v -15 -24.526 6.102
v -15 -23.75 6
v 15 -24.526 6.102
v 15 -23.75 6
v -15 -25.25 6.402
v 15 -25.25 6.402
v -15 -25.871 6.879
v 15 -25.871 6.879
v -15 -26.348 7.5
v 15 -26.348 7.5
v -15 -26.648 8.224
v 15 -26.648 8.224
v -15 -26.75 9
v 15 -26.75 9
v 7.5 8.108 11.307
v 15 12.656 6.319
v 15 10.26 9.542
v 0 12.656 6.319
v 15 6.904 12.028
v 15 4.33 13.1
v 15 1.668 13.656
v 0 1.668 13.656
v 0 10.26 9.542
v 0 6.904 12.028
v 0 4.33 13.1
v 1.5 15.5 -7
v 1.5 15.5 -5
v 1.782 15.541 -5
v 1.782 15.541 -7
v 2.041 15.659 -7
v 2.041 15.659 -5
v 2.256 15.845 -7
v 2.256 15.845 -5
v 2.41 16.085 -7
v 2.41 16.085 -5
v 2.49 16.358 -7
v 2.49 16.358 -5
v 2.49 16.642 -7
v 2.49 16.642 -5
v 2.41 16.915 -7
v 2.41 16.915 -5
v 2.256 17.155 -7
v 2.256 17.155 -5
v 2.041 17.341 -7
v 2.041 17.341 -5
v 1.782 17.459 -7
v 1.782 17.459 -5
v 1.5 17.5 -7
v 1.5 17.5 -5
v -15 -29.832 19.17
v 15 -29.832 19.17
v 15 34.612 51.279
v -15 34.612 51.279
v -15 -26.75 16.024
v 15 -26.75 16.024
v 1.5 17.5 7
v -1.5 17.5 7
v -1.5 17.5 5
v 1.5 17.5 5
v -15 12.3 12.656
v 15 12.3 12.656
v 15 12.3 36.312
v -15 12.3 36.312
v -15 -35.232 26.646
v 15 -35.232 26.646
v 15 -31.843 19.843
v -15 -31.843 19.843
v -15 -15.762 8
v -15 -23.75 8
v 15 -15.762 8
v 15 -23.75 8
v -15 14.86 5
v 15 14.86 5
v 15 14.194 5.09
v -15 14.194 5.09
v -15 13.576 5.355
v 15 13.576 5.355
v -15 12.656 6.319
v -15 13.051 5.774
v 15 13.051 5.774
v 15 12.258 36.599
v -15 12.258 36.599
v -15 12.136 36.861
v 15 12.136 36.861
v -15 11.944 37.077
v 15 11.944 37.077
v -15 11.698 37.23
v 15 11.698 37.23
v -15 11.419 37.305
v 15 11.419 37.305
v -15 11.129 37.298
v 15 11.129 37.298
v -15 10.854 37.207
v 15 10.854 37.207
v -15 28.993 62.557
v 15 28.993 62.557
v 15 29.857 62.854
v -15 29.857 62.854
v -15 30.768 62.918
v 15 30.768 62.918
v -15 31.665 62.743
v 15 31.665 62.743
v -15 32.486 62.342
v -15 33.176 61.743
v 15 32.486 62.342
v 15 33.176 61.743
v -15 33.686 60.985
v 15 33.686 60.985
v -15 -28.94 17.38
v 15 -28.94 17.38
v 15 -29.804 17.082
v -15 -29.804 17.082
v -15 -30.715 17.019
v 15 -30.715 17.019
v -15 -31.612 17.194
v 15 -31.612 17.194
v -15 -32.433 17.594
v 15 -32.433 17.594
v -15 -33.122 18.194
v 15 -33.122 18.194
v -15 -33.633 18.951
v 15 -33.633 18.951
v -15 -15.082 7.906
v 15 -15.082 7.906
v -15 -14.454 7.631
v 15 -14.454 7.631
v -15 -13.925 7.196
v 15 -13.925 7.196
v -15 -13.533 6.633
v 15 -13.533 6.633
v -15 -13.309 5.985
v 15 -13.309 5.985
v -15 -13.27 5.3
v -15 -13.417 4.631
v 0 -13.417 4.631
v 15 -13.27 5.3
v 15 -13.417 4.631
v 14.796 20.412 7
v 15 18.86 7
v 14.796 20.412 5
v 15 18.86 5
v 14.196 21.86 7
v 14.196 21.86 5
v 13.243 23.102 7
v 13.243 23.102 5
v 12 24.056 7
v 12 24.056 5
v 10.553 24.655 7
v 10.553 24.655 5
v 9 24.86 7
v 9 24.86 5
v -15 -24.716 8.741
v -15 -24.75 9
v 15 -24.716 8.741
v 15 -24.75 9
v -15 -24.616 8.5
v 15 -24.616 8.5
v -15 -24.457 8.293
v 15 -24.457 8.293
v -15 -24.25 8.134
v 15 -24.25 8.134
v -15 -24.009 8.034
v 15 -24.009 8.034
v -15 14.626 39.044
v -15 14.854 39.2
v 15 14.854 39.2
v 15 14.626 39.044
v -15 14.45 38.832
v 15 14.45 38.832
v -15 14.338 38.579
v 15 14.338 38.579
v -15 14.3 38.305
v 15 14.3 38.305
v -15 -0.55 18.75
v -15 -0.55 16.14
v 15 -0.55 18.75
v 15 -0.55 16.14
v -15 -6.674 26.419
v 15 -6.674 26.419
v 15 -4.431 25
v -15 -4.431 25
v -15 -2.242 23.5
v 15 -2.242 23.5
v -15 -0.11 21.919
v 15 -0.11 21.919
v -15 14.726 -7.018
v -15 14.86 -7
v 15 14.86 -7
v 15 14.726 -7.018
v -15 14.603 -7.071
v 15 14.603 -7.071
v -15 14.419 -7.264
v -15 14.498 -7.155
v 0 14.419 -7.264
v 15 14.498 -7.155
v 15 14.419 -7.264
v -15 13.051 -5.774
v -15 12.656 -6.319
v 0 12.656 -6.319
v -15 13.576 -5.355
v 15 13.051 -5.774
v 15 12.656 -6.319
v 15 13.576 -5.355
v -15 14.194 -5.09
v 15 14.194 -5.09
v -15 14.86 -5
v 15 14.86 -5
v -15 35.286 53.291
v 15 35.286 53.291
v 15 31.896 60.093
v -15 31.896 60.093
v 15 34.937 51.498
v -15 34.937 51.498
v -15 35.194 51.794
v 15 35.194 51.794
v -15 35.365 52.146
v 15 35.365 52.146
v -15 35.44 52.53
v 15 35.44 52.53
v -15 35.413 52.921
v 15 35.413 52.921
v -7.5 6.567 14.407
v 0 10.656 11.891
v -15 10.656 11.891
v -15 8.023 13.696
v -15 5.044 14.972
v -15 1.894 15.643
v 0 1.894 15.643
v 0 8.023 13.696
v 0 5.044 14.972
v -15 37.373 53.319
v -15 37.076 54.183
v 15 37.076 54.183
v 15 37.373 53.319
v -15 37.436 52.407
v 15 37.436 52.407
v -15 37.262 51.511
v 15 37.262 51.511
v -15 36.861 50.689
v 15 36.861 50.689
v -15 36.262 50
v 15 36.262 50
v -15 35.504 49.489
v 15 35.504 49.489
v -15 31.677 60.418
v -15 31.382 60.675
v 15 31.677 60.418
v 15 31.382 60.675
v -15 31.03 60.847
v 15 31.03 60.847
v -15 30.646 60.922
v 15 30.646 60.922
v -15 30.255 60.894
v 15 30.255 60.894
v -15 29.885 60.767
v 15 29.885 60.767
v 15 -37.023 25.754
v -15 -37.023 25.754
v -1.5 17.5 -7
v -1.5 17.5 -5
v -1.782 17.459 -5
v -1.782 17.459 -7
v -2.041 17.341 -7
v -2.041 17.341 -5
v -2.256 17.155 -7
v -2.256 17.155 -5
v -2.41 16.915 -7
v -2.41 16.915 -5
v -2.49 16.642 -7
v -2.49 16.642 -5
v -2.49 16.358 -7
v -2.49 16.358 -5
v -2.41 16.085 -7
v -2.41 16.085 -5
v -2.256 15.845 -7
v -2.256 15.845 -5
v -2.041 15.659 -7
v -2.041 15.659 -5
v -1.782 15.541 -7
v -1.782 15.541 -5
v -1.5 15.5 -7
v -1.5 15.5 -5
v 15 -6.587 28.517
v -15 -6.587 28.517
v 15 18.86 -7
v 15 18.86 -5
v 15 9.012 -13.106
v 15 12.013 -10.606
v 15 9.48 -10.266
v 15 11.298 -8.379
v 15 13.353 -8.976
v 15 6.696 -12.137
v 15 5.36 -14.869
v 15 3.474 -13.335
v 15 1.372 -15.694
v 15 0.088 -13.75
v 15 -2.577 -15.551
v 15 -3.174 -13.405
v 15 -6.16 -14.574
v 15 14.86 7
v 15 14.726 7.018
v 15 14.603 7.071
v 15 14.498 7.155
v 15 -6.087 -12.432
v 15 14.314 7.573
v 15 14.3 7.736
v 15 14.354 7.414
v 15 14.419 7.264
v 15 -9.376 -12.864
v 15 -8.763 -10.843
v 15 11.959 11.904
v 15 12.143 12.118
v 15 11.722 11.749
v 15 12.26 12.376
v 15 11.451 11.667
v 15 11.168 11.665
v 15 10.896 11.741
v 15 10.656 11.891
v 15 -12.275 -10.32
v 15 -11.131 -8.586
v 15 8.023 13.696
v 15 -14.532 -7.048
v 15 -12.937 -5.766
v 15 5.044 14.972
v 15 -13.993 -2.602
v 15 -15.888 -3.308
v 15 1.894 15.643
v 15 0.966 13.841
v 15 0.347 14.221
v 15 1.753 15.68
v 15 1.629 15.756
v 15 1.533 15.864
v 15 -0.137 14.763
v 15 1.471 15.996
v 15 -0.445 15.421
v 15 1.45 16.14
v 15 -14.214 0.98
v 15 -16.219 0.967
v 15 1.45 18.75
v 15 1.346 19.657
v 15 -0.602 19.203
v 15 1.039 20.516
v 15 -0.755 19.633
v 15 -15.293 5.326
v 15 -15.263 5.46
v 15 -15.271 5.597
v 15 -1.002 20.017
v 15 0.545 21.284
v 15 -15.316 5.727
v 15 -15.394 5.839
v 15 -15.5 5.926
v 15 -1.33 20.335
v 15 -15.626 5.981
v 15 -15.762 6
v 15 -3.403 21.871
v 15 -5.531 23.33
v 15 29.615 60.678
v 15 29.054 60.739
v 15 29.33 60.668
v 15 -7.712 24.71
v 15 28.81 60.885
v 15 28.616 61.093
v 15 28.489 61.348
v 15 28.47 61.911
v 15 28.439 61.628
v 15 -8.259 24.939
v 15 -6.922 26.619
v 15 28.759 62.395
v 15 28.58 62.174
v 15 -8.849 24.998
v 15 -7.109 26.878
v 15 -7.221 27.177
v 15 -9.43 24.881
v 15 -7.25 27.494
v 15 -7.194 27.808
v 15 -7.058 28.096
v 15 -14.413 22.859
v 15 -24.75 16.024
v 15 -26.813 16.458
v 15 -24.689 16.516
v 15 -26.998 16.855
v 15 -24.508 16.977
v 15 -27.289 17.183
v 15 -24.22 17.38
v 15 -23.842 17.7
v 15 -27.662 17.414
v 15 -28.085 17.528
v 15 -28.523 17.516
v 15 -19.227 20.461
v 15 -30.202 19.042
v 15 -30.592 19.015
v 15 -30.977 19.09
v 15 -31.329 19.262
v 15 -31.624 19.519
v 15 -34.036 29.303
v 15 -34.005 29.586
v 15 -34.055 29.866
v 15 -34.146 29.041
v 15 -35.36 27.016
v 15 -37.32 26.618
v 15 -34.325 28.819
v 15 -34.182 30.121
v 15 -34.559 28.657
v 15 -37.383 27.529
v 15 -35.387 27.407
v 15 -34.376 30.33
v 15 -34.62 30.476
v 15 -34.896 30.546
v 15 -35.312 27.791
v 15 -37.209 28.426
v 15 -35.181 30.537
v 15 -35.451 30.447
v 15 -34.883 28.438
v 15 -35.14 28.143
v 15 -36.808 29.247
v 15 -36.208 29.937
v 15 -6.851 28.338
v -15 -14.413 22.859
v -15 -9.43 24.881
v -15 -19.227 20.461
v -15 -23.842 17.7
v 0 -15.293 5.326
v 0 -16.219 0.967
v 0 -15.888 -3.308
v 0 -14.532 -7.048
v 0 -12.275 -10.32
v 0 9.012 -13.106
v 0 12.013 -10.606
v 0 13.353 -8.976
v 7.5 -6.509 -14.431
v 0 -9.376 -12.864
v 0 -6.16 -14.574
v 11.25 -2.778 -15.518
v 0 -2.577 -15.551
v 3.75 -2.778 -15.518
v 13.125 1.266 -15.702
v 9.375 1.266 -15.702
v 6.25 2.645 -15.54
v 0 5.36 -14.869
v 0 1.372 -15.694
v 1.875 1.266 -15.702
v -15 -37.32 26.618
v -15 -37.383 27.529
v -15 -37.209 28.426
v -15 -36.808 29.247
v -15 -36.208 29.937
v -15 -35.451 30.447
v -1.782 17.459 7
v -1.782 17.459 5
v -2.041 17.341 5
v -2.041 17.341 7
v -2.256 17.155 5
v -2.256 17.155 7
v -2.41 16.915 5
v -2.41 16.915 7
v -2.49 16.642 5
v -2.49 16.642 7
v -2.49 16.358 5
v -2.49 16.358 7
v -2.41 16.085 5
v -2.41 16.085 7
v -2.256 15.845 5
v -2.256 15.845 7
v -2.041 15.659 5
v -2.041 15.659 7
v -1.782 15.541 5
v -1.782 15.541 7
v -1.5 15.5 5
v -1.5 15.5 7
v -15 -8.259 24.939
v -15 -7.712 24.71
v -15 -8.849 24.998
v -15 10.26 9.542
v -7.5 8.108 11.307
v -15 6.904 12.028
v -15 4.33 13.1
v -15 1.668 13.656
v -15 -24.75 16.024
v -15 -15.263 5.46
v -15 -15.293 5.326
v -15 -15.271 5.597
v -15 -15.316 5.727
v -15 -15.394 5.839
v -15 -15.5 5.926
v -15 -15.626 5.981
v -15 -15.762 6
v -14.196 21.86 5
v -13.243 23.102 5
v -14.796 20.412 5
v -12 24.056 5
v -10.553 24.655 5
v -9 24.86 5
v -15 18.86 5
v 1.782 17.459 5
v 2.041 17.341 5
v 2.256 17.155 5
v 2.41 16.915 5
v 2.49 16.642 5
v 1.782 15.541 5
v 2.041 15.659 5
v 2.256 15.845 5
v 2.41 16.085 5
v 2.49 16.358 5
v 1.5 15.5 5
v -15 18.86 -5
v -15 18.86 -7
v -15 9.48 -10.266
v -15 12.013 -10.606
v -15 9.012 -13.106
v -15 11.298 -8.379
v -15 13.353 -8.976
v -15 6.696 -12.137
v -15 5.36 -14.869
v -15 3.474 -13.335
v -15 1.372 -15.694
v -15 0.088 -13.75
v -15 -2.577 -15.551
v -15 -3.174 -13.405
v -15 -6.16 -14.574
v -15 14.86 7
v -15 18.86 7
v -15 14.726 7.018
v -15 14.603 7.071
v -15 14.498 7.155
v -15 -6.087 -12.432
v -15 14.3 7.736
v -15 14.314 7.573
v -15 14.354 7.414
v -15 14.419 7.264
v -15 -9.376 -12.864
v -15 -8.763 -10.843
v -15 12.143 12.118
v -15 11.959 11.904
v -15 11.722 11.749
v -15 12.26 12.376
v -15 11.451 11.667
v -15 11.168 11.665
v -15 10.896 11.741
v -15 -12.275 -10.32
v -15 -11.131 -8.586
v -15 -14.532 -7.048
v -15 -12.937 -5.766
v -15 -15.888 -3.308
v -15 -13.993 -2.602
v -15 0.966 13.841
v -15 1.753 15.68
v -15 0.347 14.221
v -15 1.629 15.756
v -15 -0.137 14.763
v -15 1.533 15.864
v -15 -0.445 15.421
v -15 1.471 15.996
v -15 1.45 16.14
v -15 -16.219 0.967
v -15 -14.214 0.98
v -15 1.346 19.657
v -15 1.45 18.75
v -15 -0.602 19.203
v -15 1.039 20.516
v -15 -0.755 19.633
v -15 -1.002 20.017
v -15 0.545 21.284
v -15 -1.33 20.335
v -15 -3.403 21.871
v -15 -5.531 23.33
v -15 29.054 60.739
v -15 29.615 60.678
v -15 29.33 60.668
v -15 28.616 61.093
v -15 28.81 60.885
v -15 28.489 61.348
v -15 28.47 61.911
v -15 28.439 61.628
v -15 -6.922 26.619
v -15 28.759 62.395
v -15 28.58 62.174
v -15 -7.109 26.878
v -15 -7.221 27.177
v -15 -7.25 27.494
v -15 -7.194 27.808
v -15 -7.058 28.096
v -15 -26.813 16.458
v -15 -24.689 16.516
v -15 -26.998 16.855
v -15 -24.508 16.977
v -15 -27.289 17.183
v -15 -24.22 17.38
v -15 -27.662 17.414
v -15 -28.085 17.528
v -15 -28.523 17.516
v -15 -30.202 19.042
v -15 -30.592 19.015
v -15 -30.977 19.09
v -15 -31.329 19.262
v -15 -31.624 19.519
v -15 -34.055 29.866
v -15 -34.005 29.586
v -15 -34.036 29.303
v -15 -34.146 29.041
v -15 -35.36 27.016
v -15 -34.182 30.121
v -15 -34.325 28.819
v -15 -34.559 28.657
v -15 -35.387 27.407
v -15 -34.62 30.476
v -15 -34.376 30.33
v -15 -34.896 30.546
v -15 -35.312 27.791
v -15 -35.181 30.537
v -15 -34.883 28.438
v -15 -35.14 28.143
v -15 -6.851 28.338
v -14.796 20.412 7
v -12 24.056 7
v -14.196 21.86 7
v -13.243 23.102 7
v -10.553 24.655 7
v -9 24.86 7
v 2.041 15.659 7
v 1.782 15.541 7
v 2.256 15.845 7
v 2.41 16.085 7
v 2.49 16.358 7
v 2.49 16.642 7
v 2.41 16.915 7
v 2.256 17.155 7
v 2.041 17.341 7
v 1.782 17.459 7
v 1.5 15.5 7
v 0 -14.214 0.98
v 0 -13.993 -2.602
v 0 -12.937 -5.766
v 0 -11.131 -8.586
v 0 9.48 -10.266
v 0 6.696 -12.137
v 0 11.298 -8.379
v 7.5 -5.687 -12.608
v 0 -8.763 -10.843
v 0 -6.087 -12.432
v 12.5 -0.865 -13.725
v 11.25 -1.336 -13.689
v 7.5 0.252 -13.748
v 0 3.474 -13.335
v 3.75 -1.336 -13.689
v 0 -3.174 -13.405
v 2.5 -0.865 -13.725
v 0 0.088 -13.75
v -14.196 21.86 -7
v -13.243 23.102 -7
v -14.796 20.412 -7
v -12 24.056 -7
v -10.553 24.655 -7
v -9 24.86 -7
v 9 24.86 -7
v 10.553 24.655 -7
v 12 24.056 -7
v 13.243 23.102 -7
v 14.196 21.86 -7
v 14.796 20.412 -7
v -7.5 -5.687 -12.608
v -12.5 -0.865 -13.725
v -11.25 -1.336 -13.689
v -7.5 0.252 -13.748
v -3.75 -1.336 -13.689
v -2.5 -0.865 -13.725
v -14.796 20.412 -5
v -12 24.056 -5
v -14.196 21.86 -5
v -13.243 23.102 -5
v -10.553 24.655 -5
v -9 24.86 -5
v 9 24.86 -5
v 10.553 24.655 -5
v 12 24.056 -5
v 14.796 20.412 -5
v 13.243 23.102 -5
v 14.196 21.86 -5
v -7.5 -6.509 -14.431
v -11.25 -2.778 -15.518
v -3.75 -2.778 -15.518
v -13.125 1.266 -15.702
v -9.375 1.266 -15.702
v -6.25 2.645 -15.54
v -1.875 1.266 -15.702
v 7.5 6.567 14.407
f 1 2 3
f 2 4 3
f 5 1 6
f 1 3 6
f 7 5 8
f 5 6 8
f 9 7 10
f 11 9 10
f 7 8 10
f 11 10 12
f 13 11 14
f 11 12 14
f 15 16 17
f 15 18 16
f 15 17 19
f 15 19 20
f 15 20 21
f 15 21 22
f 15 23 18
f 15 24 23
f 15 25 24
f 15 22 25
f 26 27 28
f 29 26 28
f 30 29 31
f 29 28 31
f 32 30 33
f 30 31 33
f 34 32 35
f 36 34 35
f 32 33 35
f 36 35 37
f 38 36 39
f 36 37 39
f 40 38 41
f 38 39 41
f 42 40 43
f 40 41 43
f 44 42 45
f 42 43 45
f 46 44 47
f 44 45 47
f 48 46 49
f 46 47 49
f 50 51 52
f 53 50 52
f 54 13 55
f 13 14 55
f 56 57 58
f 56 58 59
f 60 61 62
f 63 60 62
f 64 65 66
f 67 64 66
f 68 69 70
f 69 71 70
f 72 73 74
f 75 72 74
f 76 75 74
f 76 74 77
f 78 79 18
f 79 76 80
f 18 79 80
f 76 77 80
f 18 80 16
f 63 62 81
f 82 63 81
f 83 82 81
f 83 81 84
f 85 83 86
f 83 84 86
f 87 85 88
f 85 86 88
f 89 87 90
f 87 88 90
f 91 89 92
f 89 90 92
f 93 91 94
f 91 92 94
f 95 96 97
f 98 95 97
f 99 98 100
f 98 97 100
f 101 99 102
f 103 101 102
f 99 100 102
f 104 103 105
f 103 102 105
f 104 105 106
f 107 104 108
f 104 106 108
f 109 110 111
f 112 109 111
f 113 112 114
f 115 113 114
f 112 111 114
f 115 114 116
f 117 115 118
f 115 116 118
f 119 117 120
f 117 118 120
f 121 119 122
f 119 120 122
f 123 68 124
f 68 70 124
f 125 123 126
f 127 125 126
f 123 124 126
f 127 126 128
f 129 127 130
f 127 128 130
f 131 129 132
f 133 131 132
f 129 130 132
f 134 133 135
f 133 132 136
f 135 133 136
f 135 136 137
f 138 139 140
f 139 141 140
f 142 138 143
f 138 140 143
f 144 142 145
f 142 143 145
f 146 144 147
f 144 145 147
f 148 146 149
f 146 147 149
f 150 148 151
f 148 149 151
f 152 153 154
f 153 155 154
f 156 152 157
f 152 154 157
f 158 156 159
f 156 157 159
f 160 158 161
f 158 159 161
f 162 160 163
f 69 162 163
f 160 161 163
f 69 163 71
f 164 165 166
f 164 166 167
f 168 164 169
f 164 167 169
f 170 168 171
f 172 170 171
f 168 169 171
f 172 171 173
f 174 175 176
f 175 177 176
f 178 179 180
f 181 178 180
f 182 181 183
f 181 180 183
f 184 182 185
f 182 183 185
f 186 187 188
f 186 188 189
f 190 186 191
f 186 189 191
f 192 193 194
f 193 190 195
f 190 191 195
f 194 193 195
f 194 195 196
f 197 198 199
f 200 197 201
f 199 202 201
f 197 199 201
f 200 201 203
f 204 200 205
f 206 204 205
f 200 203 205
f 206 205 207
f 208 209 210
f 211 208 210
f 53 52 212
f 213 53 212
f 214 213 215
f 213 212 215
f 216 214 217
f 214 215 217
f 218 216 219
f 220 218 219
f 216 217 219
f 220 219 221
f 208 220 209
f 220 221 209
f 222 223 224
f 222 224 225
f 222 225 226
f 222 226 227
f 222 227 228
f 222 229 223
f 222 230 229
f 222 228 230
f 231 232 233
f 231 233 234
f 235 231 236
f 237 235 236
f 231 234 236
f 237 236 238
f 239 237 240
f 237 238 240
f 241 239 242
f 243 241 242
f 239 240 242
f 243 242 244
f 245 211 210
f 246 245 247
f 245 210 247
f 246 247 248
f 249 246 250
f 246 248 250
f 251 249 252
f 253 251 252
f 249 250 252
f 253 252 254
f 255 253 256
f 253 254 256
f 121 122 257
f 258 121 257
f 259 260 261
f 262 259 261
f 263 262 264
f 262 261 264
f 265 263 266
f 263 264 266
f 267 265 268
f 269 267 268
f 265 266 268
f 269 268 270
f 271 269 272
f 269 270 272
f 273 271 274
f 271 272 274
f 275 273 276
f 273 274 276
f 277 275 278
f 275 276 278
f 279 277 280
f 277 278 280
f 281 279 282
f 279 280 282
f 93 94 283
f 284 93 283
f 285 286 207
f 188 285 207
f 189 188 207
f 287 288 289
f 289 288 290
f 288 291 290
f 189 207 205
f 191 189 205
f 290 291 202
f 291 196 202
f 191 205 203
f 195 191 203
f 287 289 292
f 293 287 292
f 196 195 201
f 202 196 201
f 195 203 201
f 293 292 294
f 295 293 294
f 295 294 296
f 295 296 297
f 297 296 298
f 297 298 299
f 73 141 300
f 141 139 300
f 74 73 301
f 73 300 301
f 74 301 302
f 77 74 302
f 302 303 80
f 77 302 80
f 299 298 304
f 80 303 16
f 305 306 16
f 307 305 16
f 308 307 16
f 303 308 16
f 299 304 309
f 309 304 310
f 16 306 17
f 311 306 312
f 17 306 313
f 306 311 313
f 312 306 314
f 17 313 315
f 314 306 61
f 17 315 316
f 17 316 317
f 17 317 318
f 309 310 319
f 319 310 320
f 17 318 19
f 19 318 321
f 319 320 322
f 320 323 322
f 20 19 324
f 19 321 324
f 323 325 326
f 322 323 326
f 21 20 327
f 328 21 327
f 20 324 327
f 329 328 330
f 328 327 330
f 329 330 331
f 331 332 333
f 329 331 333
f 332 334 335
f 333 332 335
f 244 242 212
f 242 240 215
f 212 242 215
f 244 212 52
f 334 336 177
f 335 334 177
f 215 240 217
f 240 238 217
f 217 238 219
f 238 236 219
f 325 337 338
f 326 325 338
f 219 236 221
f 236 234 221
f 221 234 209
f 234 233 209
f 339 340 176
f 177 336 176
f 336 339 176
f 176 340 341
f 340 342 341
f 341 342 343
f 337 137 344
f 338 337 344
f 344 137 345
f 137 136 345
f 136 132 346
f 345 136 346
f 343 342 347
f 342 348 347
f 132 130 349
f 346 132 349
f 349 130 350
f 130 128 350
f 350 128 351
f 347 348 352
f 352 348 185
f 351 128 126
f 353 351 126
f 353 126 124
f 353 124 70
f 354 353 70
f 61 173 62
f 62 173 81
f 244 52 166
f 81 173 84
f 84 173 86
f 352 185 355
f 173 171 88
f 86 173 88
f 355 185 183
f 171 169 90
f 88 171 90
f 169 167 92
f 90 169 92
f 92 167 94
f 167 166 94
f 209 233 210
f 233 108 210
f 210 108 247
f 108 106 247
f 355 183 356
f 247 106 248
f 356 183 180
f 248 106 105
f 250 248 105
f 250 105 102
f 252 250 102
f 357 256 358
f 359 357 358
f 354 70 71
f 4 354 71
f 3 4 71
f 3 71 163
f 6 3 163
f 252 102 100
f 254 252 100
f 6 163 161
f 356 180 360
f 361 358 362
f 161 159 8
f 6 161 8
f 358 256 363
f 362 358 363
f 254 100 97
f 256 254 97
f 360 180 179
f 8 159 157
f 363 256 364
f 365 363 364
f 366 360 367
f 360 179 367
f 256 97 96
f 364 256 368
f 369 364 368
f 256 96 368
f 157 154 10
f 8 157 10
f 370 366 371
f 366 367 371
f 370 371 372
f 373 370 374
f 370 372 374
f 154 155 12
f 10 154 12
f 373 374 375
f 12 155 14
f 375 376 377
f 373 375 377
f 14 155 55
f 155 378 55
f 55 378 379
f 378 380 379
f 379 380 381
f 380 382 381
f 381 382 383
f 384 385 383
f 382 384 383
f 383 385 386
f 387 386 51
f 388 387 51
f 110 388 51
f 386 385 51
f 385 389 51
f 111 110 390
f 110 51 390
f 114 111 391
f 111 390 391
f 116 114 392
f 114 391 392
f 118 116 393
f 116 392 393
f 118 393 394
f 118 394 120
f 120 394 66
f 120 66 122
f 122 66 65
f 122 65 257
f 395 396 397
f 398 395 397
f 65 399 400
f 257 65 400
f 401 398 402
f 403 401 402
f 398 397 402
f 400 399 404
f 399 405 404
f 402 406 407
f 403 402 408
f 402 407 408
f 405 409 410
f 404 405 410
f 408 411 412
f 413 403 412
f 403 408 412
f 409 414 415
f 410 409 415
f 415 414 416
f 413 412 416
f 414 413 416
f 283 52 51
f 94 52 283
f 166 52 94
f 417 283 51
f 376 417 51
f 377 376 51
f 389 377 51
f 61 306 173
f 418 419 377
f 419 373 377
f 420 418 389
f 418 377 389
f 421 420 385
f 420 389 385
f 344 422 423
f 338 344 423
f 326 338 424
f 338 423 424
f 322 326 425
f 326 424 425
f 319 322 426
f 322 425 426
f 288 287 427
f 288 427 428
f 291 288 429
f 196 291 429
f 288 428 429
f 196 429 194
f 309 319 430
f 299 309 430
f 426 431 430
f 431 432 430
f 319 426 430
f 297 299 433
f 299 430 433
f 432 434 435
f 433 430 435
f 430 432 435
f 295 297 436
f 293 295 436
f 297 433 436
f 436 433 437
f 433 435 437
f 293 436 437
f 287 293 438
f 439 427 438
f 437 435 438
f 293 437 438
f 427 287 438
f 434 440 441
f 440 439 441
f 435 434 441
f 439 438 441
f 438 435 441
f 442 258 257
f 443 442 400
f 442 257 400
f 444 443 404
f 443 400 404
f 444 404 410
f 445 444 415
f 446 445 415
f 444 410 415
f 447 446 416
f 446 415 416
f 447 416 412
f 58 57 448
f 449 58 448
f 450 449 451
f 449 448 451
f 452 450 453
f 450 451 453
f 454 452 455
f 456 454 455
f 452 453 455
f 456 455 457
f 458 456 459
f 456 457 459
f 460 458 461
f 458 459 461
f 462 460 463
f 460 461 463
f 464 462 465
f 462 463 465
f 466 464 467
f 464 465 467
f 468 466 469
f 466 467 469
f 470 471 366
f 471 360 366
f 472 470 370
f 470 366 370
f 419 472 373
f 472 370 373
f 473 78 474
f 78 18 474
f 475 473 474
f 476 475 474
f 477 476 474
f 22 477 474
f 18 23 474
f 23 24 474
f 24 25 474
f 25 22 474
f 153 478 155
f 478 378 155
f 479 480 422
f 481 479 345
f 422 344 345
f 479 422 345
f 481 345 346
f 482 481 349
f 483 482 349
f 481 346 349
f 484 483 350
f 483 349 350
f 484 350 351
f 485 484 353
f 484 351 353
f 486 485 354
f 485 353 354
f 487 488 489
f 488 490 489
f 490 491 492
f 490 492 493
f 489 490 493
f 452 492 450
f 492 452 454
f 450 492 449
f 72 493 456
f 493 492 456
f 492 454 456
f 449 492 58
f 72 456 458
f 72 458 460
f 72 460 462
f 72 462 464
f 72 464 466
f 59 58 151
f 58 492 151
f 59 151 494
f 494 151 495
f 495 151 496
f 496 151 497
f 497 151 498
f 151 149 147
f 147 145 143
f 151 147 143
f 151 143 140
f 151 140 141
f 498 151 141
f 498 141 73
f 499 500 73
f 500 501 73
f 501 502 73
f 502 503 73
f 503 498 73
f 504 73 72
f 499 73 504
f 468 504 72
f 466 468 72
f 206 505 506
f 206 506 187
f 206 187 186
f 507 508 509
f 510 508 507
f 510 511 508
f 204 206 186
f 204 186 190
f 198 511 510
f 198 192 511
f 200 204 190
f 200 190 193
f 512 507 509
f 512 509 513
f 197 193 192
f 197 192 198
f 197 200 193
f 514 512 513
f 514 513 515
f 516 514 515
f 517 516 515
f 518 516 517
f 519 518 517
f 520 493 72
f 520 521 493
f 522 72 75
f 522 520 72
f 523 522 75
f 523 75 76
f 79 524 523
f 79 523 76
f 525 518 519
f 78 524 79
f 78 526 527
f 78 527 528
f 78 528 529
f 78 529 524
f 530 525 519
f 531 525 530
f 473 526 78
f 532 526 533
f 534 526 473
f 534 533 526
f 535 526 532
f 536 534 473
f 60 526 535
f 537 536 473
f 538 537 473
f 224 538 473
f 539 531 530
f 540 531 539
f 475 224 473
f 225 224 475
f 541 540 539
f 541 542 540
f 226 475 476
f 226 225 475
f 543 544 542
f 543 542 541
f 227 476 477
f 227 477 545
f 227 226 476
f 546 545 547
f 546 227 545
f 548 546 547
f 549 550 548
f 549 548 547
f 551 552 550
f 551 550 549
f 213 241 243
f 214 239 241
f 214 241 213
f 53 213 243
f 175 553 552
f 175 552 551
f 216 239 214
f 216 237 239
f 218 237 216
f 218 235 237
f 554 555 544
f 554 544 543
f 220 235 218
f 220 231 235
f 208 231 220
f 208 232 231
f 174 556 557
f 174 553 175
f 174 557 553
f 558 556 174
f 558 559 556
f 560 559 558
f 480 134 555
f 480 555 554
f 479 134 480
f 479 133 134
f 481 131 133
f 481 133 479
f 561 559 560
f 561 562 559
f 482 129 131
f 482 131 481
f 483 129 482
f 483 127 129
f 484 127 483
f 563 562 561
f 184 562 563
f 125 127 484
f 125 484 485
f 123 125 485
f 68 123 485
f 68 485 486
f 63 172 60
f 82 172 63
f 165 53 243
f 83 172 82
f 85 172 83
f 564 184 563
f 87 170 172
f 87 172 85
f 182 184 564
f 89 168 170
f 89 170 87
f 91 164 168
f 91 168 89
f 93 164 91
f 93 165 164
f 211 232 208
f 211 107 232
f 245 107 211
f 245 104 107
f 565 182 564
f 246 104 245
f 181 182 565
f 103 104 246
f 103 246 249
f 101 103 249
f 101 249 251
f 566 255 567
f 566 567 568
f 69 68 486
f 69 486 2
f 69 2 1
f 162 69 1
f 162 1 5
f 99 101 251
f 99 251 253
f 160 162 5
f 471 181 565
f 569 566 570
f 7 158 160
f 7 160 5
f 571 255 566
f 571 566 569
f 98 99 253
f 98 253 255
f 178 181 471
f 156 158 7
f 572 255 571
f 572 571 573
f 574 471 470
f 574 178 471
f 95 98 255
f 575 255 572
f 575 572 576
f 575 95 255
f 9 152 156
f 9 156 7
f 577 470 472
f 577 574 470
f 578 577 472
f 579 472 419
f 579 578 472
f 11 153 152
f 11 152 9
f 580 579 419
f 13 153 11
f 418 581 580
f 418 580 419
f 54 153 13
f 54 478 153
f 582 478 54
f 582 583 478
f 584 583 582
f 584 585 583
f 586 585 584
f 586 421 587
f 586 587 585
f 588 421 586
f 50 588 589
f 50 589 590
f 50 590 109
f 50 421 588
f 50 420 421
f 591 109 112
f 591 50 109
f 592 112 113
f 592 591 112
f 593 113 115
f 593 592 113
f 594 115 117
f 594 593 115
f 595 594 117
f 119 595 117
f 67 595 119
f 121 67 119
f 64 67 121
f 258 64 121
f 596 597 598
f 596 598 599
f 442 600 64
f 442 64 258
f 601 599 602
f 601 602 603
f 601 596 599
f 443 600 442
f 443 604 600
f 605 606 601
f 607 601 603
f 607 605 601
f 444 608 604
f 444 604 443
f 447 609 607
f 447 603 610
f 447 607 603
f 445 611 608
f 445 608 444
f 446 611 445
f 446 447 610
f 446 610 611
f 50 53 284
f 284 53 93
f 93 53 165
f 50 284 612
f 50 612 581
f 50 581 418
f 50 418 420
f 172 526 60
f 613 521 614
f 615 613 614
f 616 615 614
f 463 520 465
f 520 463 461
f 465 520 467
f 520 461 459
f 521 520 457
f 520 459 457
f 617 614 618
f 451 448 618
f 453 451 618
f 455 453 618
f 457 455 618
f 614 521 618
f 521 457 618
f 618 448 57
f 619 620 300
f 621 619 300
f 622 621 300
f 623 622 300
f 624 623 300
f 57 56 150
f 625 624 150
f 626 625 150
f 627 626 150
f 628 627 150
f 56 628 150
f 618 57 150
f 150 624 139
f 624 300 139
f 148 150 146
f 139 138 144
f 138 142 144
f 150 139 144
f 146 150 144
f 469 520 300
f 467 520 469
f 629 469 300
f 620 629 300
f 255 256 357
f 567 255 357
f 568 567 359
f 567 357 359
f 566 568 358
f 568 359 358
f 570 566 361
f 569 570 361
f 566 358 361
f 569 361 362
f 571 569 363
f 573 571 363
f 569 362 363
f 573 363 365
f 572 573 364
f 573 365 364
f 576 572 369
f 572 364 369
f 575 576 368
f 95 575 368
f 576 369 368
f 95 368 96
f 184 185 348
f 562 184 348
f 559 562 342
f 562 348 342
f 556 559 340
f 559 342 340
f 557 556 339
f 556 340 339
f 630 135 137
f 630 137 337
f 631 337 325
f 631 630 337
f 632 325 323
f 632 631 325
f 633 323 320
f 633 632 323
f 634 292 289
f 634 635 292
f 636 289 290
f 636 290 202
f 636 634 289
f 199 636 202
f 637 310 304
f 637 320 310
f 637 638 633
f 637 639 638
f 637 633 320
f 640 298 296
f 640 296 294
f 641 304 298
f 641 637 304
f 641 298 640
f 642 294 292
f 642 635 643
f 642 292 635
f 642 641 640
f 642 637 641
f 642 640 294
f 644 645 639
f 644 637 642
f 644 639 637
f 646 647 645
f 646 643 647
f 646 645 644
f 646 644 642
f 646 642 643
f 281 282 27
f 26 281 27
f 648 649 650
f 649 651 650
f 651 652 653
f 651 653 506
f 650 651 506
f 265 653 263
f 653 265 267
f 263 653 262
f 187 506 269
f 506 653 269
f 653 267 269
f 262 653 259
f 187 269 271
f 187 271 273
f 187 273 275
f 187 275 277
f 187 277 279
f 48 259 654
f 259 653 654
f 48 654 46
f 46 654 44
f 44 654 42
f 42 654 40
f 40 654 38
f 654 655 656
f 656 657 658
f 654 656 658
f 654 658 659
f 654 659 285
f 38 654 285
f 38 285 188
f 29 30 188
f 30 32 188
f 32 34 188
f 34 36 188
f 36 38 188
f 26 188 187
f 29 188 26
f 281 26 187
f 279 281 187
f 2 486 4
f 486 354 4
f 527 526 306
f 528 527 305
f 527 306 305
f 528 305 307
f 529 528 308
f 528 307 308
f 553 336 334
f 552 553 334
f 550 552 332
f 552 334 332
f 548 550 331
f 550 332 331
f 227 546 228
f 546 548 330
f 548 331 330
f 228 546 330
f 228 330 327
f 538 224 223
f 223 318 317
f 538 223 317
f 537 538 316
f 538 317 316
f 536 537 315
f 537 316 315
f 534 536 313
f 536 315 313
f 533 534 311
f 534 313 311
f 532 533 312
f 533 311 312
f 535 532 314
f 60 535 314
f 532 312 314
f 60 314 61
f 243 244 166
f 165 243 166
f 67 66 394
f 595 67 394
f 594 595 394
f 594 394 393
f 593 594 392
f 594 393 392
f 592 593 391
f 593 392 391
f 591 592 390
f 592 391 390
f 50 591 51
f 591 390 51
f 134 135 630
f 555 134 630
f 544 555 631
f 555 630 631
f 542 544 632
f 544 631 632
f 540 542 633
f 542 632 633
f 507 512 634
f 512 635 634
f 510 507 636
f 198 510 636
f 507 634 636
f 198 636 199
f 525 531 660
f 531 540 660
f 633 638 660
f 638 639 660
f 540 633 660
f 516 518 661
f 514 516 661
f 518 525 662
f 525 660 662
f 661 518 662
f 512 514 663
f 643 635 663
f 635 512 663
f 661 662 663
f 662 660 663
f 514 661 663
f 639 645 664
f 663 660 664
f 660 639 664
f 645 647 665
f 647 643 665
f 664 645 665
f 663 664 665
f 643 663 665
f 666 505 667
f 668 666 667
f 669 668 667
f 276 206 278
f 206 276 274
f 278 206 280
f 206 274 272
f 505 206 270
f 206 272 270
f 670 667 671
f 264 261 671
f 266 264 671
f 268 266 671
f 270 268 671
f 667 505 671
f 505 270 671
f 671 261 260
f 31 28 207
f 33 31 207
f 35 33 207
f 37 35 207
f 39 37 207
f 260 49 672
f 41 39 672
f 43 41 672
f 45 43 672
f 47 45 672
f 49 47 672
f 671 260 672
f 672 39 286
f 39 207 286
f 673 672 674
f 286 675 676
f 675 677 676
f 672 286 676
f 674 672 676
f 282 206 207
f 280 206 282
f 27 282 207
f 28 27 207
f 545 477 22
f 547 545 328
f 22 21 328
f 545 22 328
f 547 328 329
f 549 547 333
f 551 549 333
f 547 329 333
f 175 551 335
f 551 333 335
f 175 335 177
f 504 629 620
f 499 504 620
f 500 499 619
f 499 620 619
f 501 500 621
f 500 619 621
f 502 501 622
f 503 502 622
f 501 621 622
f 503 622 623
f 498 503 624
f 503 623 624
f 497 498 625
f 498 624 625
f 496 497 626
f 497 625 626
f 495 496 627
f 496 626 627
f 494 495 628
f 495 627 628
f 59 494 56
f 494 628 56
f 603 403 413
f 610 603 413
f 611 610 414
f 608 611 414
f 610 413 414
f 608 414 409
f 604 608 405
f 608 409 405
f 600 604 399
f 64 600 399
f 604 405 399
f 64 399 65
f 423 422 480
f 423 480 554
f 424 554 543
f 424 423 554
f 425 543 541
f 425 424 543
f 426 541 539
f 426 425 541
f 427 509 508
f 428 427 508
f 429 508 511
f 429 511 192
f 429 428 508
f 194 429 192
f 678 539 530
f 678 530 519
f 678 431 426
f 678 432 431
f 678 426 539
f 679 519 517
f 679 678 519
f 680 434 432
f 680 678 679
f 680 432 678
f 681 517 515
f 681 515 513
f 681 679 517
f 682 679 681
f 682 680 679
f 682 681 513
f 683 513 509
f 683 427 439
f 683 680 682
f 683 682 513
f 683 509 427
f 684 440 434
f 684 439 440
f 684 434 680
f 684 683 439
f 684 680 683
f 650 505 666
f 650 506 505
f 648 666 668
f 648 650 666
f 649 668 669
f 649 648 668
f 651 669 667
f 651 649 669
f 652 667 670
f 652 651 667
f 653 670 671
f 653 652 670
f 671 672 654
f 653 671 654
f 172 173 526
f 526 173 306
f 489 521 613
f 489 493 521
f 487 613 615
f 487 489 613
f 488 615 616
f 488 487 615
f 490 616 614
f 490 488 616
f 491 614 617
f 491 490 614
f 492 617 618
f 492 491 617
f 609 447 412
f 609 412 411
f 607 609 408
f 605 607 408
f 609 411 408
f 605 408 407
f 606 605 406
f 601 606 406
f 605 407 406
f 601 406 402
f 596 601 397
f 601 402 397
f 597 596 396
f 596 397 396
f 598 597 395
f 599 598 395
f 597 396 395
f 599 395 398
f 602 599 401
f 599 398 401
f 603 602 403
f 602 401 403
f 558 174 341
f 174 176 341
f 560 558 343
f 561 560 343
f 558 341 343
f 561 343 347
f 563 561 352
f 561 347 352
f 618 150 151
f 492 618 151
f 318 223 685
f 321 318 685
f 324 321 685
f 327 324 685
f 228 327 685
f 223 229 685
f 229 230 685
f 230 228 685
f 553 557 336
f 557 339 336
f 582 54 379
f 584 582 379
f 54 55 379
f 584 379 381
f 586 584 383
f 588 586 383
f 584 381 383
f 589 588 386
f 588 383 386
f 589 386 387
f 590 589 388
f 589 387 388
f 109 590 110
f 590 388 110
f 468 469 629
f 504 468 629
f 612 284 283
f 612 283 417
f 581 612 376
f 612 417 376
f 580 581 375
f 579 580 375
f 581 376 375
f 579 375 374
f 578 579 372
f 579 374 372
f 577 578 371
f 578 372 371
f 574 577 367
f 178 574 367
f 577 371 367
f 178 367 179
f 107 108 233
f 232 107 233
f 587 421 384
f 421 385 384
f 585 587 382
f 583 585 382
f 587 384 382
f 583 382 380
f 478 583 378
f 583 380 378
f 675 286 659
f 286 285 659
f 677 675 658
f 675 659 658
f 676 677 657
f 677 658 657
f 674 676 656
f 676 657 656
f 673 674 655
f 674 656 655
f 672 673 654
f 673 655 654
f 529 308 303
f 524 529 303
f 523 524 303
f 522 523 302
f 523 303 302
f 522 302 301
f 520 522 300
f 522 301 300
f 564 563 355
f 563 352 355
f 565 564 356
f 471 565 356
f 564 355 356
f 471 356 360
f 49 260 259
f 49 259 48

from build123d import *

# Parameters (mm, degrees)
PAD_DEPTH    = 15
POCKET_DEPTH = 8
FILLET_R     = 6


with BuildPart() as part:
    # Sketch → Pad (new body, symmetric)
    with BuildSketch(Plane.YZ):
        with BuildLine():
            ThreePointArc((14.859525, 5), (13.575687, 5.354828), (12.656284, 6.318591))
            add(Edge.make_bspline(
                [(12.656284, 6.318591), (9.180127, 12.801365), (1.667575, 13.655527)],
                knots=[0.47747, 0.47747, 0.47747, 1.453505, 1.453505, 1.453505], degree=2, weights=[1, 0.883264, 1]))
            ThreePointArc((1.667575, 13.655527), (0.085052, 14.4746), (-0.55, 16.139523))
            Line((-0.55, 16.139523), (-0.55, 18.75))
            ThreePointArc((-0.55, 18.75), (-0.755496, 19.633037), (-1.329754, 20.334613))
            ThreePointArc((-1.329754, 20.334613), (-4.460432, 22.61037), (-7.712107, 24.709613))
            ThreePointArc((-7.712107, 24.709613), (-8.551696, 24.990145), (-9.430133, 24.880803))
            ThreePointArc((-9.430133, 24.880803), (-16.843172, 21.706161), (-23.841898, 17.7))
            ThreePointArc((-23.841898, 17.7), (-24.508379, 16.977307), (-24.75, 16.024363))
            Line((-24.75, 16.024363), (-24.75, 9))
            ThreePointArc((-24.75, 9), (-24.457107, 8.292893), (-23.75, 8))
            Line((-23.75, 8), (-15.761615, 8))
            ThreePointArc((-15.761615, 8), (-13.709464, 6.927846), (-13.417467, 4.630983))
            add(Edge.make_bspline(
                [(-13.417467, 4.630983), (-17.905702, -7.476352), (-5.68662, -12.60771), (6.532461, -17.739067), (12.656284, -6.318591)],
                knots=[2.798078, 2.798078, 2.798078, 4.301896, 4.301896, 5.805715, 5.805715, 5.805715], degree=2, weights=[1, 0.730386, 1, 0.730386, 1]))
            ThreePointArc((12.656284, -6.318591), (13.575687, -5.354828), (14.859525, -5))
            Line((14.859525, -5), (24.859525, -5))
            Line((24.859525, -5), (24.859525, -7))
            Line((24.859525, -7), (14.859525, -7))
            ThreePointArc((14.859525, -7), (14.602761, -7.070964), (14.41888, -7.263711))
            add(Edge.make_bspline(
                [(-15.292794, 5.326167), (-20.430323, -8.532169), (-6.509034, -14.431107), (7.412256, -20.330046), (14.41888, -7.263711)],
                knots=[2.797097, 2.797097, 2.797097, 4.300712, 4.300712, 5.804327, 5.804327, 5.804327], degree=2, weights=[1, 0.730456, 1, 0.730456, 1]))
            ThreePointArc((-15.292794, 5.326167), (-15.351188, 5.785537), (-15.761615, 5.999967))
            Line((-15.761615, 5.999967), (-23.75, 5.999967))
            ThreePointArc((-23.75, 5.999967), (-25.871343, 6.878657), (-26.750033, 9))
            Line((-26.750033, 9), (-26.750033, 16.024342))
            ThreePointArc((-26.750033, 16.024342), (-27.467308, 17.311903), (-28.93962, 17.379689))
            ThreePointArc((-28.93962, 17.379689), (-31.611926, 17.193515), (-33.633178, 18.951476))
            Line((-33.633178, 18.951476), (-37.02253, 25.75385))
            ThreePointArc((-37.02253, 25.75385), (-37.208704, 28.426157), (-35.450743, 30.447408))
            ThreePointArc((-35.450743, 30.447408), (-34.109726, 29.998326), (-34.558808, 28.657309))
            ThreePointArc((-34.558808, 28.657309), (-35.31222, 27.791059), (-35.232431, 26.645785))
            Line((-35.232431, 26.645785), (-31.843079, 19.84341))
            ThreePointArc((-31.843079, 19.84341), (-30.976829, 19.089999), (-29.831554, 19.169788))
            Line((-29.831554, 19.169788), (34.61199, 51.279437))
            ThreePointArc((34.61199, 51.279437), (35.365402, 52.145688), (35.285613, 53.290962))
            Line((35.285613, 53.290962), (31.896261, 60.093336))
            ThreePointArc((31.896261, 60.093336), (31.03001, 60.846748), (29.884736, 60.766959))
            ThreePointArc((29.884736, 60.766959), (28.54372, 61.216041), (28.992801, 62.557057))
            ThreePointArc((28.992801, 62.557057), (31.665108, 62.743232), (33.686359, 60.985271))
            Line((33.686359, 60.985271), (37.075711, 54.182897))
            ThreePointArc((37.075711, 54.182897), (37.261886, 51.51059), (35.503925, 49.489339))
            Line((35.503925, 49.489339), (14.854206, 39.200407))
            ThreePointArc((14.854206, 39.200407), (14.449889, 38.831681), (14.300173, 38.305358))
            Line((14.300173, 38.305358), (14.300173, 7.736282))
            ThreePointArc((14.300173, 7.736282), (14.330303, 7.49266), (14.418877, 7.263718))
            ThreePointArc((14.418877, 7.263718), (14.602757, 7.070966), (14.859525, 7))
            Line((14.859525, 7), (24.859525, 7))
            Line((24.859525, 7), (24.859525, 5))
            Line((24.859525, 5), (14.859525, 5))
        make_face()
        with BuildLine():
            Line((1.45, 18.75), (1.45, 16.139523))
            ThreePointArc((1.45, 16.139523), (1.577009, 15.80654), (1.893511, 15.642724))
            add(Edge.make_bspline(
                [(10.656145, 11.890813), (6.87187, 15.076658), (1.893511, 15.642724)],
                knots=[0.85548, 0.85548, 0.85548, 1.453884, 1.453884, 1.453884], degree=2, weights=[1, 0.955572, 1]))
            ThreePointArc((10.656145, 11.890813), (11.722057, 11.749165), (12.300173, 12.655815))
            Line((12.300173, 12.655815), (12.300173, 36.312317))
            ThreePointArc((12.300173, 36.312317), (11.826496, 37.162601), (10.854206, 37.207366))
            Line((10.854206, 37.207366), (-6.586713, 28.517252))
            ThreePointArc((-6.586713, 28.517252), (-7.24994, 27.494075), (-6.674214, 26.419227))
            ThreePointArc((-6.674214, 26.419227), (-3.329634, 24.260005), (-0.109508, 21.919227))
            ThreePointArc((-0.109508, 21.919227), (1.039009, 20.516073), (1.45, 18.75))
        make_face(mode=Mode.SUBTRACT)
    extrude(amount=PAD_DEPTH, both=True)

    # Sketch001 → Pocket (cut, symmetric)
    with BuildSketch(Plane.XY):
        with BuildLine():
            ThreePointArc((-1.5, 17.5), (-2.5, 16.5), (-1.5, 15.5))
            Line((-1.5, 15.5), (1.5, 15.5))
            ThreePointArc((1.5, 15.5), (2.5, 16.5), (1.5, 17.5))
            Line((-1.5, 17.5), (1.5, 17.5))
        make_face()
    extrude(amount=POCKET_DEPTH, both=True, mode=Mode.SUBTRACT)

    # Fillet
    fillet_edges = [part.edges().sort_by_distance(p)[0] for p in [
        (15, 24.859525, 6),
        (15, 24.859525, -6),
        (-15, 24.859525, -6),
        (-15, 24.859525, 6),
    ]]
    fillet(fillet_edges, radius=FILLET_R)


solid = part.part
